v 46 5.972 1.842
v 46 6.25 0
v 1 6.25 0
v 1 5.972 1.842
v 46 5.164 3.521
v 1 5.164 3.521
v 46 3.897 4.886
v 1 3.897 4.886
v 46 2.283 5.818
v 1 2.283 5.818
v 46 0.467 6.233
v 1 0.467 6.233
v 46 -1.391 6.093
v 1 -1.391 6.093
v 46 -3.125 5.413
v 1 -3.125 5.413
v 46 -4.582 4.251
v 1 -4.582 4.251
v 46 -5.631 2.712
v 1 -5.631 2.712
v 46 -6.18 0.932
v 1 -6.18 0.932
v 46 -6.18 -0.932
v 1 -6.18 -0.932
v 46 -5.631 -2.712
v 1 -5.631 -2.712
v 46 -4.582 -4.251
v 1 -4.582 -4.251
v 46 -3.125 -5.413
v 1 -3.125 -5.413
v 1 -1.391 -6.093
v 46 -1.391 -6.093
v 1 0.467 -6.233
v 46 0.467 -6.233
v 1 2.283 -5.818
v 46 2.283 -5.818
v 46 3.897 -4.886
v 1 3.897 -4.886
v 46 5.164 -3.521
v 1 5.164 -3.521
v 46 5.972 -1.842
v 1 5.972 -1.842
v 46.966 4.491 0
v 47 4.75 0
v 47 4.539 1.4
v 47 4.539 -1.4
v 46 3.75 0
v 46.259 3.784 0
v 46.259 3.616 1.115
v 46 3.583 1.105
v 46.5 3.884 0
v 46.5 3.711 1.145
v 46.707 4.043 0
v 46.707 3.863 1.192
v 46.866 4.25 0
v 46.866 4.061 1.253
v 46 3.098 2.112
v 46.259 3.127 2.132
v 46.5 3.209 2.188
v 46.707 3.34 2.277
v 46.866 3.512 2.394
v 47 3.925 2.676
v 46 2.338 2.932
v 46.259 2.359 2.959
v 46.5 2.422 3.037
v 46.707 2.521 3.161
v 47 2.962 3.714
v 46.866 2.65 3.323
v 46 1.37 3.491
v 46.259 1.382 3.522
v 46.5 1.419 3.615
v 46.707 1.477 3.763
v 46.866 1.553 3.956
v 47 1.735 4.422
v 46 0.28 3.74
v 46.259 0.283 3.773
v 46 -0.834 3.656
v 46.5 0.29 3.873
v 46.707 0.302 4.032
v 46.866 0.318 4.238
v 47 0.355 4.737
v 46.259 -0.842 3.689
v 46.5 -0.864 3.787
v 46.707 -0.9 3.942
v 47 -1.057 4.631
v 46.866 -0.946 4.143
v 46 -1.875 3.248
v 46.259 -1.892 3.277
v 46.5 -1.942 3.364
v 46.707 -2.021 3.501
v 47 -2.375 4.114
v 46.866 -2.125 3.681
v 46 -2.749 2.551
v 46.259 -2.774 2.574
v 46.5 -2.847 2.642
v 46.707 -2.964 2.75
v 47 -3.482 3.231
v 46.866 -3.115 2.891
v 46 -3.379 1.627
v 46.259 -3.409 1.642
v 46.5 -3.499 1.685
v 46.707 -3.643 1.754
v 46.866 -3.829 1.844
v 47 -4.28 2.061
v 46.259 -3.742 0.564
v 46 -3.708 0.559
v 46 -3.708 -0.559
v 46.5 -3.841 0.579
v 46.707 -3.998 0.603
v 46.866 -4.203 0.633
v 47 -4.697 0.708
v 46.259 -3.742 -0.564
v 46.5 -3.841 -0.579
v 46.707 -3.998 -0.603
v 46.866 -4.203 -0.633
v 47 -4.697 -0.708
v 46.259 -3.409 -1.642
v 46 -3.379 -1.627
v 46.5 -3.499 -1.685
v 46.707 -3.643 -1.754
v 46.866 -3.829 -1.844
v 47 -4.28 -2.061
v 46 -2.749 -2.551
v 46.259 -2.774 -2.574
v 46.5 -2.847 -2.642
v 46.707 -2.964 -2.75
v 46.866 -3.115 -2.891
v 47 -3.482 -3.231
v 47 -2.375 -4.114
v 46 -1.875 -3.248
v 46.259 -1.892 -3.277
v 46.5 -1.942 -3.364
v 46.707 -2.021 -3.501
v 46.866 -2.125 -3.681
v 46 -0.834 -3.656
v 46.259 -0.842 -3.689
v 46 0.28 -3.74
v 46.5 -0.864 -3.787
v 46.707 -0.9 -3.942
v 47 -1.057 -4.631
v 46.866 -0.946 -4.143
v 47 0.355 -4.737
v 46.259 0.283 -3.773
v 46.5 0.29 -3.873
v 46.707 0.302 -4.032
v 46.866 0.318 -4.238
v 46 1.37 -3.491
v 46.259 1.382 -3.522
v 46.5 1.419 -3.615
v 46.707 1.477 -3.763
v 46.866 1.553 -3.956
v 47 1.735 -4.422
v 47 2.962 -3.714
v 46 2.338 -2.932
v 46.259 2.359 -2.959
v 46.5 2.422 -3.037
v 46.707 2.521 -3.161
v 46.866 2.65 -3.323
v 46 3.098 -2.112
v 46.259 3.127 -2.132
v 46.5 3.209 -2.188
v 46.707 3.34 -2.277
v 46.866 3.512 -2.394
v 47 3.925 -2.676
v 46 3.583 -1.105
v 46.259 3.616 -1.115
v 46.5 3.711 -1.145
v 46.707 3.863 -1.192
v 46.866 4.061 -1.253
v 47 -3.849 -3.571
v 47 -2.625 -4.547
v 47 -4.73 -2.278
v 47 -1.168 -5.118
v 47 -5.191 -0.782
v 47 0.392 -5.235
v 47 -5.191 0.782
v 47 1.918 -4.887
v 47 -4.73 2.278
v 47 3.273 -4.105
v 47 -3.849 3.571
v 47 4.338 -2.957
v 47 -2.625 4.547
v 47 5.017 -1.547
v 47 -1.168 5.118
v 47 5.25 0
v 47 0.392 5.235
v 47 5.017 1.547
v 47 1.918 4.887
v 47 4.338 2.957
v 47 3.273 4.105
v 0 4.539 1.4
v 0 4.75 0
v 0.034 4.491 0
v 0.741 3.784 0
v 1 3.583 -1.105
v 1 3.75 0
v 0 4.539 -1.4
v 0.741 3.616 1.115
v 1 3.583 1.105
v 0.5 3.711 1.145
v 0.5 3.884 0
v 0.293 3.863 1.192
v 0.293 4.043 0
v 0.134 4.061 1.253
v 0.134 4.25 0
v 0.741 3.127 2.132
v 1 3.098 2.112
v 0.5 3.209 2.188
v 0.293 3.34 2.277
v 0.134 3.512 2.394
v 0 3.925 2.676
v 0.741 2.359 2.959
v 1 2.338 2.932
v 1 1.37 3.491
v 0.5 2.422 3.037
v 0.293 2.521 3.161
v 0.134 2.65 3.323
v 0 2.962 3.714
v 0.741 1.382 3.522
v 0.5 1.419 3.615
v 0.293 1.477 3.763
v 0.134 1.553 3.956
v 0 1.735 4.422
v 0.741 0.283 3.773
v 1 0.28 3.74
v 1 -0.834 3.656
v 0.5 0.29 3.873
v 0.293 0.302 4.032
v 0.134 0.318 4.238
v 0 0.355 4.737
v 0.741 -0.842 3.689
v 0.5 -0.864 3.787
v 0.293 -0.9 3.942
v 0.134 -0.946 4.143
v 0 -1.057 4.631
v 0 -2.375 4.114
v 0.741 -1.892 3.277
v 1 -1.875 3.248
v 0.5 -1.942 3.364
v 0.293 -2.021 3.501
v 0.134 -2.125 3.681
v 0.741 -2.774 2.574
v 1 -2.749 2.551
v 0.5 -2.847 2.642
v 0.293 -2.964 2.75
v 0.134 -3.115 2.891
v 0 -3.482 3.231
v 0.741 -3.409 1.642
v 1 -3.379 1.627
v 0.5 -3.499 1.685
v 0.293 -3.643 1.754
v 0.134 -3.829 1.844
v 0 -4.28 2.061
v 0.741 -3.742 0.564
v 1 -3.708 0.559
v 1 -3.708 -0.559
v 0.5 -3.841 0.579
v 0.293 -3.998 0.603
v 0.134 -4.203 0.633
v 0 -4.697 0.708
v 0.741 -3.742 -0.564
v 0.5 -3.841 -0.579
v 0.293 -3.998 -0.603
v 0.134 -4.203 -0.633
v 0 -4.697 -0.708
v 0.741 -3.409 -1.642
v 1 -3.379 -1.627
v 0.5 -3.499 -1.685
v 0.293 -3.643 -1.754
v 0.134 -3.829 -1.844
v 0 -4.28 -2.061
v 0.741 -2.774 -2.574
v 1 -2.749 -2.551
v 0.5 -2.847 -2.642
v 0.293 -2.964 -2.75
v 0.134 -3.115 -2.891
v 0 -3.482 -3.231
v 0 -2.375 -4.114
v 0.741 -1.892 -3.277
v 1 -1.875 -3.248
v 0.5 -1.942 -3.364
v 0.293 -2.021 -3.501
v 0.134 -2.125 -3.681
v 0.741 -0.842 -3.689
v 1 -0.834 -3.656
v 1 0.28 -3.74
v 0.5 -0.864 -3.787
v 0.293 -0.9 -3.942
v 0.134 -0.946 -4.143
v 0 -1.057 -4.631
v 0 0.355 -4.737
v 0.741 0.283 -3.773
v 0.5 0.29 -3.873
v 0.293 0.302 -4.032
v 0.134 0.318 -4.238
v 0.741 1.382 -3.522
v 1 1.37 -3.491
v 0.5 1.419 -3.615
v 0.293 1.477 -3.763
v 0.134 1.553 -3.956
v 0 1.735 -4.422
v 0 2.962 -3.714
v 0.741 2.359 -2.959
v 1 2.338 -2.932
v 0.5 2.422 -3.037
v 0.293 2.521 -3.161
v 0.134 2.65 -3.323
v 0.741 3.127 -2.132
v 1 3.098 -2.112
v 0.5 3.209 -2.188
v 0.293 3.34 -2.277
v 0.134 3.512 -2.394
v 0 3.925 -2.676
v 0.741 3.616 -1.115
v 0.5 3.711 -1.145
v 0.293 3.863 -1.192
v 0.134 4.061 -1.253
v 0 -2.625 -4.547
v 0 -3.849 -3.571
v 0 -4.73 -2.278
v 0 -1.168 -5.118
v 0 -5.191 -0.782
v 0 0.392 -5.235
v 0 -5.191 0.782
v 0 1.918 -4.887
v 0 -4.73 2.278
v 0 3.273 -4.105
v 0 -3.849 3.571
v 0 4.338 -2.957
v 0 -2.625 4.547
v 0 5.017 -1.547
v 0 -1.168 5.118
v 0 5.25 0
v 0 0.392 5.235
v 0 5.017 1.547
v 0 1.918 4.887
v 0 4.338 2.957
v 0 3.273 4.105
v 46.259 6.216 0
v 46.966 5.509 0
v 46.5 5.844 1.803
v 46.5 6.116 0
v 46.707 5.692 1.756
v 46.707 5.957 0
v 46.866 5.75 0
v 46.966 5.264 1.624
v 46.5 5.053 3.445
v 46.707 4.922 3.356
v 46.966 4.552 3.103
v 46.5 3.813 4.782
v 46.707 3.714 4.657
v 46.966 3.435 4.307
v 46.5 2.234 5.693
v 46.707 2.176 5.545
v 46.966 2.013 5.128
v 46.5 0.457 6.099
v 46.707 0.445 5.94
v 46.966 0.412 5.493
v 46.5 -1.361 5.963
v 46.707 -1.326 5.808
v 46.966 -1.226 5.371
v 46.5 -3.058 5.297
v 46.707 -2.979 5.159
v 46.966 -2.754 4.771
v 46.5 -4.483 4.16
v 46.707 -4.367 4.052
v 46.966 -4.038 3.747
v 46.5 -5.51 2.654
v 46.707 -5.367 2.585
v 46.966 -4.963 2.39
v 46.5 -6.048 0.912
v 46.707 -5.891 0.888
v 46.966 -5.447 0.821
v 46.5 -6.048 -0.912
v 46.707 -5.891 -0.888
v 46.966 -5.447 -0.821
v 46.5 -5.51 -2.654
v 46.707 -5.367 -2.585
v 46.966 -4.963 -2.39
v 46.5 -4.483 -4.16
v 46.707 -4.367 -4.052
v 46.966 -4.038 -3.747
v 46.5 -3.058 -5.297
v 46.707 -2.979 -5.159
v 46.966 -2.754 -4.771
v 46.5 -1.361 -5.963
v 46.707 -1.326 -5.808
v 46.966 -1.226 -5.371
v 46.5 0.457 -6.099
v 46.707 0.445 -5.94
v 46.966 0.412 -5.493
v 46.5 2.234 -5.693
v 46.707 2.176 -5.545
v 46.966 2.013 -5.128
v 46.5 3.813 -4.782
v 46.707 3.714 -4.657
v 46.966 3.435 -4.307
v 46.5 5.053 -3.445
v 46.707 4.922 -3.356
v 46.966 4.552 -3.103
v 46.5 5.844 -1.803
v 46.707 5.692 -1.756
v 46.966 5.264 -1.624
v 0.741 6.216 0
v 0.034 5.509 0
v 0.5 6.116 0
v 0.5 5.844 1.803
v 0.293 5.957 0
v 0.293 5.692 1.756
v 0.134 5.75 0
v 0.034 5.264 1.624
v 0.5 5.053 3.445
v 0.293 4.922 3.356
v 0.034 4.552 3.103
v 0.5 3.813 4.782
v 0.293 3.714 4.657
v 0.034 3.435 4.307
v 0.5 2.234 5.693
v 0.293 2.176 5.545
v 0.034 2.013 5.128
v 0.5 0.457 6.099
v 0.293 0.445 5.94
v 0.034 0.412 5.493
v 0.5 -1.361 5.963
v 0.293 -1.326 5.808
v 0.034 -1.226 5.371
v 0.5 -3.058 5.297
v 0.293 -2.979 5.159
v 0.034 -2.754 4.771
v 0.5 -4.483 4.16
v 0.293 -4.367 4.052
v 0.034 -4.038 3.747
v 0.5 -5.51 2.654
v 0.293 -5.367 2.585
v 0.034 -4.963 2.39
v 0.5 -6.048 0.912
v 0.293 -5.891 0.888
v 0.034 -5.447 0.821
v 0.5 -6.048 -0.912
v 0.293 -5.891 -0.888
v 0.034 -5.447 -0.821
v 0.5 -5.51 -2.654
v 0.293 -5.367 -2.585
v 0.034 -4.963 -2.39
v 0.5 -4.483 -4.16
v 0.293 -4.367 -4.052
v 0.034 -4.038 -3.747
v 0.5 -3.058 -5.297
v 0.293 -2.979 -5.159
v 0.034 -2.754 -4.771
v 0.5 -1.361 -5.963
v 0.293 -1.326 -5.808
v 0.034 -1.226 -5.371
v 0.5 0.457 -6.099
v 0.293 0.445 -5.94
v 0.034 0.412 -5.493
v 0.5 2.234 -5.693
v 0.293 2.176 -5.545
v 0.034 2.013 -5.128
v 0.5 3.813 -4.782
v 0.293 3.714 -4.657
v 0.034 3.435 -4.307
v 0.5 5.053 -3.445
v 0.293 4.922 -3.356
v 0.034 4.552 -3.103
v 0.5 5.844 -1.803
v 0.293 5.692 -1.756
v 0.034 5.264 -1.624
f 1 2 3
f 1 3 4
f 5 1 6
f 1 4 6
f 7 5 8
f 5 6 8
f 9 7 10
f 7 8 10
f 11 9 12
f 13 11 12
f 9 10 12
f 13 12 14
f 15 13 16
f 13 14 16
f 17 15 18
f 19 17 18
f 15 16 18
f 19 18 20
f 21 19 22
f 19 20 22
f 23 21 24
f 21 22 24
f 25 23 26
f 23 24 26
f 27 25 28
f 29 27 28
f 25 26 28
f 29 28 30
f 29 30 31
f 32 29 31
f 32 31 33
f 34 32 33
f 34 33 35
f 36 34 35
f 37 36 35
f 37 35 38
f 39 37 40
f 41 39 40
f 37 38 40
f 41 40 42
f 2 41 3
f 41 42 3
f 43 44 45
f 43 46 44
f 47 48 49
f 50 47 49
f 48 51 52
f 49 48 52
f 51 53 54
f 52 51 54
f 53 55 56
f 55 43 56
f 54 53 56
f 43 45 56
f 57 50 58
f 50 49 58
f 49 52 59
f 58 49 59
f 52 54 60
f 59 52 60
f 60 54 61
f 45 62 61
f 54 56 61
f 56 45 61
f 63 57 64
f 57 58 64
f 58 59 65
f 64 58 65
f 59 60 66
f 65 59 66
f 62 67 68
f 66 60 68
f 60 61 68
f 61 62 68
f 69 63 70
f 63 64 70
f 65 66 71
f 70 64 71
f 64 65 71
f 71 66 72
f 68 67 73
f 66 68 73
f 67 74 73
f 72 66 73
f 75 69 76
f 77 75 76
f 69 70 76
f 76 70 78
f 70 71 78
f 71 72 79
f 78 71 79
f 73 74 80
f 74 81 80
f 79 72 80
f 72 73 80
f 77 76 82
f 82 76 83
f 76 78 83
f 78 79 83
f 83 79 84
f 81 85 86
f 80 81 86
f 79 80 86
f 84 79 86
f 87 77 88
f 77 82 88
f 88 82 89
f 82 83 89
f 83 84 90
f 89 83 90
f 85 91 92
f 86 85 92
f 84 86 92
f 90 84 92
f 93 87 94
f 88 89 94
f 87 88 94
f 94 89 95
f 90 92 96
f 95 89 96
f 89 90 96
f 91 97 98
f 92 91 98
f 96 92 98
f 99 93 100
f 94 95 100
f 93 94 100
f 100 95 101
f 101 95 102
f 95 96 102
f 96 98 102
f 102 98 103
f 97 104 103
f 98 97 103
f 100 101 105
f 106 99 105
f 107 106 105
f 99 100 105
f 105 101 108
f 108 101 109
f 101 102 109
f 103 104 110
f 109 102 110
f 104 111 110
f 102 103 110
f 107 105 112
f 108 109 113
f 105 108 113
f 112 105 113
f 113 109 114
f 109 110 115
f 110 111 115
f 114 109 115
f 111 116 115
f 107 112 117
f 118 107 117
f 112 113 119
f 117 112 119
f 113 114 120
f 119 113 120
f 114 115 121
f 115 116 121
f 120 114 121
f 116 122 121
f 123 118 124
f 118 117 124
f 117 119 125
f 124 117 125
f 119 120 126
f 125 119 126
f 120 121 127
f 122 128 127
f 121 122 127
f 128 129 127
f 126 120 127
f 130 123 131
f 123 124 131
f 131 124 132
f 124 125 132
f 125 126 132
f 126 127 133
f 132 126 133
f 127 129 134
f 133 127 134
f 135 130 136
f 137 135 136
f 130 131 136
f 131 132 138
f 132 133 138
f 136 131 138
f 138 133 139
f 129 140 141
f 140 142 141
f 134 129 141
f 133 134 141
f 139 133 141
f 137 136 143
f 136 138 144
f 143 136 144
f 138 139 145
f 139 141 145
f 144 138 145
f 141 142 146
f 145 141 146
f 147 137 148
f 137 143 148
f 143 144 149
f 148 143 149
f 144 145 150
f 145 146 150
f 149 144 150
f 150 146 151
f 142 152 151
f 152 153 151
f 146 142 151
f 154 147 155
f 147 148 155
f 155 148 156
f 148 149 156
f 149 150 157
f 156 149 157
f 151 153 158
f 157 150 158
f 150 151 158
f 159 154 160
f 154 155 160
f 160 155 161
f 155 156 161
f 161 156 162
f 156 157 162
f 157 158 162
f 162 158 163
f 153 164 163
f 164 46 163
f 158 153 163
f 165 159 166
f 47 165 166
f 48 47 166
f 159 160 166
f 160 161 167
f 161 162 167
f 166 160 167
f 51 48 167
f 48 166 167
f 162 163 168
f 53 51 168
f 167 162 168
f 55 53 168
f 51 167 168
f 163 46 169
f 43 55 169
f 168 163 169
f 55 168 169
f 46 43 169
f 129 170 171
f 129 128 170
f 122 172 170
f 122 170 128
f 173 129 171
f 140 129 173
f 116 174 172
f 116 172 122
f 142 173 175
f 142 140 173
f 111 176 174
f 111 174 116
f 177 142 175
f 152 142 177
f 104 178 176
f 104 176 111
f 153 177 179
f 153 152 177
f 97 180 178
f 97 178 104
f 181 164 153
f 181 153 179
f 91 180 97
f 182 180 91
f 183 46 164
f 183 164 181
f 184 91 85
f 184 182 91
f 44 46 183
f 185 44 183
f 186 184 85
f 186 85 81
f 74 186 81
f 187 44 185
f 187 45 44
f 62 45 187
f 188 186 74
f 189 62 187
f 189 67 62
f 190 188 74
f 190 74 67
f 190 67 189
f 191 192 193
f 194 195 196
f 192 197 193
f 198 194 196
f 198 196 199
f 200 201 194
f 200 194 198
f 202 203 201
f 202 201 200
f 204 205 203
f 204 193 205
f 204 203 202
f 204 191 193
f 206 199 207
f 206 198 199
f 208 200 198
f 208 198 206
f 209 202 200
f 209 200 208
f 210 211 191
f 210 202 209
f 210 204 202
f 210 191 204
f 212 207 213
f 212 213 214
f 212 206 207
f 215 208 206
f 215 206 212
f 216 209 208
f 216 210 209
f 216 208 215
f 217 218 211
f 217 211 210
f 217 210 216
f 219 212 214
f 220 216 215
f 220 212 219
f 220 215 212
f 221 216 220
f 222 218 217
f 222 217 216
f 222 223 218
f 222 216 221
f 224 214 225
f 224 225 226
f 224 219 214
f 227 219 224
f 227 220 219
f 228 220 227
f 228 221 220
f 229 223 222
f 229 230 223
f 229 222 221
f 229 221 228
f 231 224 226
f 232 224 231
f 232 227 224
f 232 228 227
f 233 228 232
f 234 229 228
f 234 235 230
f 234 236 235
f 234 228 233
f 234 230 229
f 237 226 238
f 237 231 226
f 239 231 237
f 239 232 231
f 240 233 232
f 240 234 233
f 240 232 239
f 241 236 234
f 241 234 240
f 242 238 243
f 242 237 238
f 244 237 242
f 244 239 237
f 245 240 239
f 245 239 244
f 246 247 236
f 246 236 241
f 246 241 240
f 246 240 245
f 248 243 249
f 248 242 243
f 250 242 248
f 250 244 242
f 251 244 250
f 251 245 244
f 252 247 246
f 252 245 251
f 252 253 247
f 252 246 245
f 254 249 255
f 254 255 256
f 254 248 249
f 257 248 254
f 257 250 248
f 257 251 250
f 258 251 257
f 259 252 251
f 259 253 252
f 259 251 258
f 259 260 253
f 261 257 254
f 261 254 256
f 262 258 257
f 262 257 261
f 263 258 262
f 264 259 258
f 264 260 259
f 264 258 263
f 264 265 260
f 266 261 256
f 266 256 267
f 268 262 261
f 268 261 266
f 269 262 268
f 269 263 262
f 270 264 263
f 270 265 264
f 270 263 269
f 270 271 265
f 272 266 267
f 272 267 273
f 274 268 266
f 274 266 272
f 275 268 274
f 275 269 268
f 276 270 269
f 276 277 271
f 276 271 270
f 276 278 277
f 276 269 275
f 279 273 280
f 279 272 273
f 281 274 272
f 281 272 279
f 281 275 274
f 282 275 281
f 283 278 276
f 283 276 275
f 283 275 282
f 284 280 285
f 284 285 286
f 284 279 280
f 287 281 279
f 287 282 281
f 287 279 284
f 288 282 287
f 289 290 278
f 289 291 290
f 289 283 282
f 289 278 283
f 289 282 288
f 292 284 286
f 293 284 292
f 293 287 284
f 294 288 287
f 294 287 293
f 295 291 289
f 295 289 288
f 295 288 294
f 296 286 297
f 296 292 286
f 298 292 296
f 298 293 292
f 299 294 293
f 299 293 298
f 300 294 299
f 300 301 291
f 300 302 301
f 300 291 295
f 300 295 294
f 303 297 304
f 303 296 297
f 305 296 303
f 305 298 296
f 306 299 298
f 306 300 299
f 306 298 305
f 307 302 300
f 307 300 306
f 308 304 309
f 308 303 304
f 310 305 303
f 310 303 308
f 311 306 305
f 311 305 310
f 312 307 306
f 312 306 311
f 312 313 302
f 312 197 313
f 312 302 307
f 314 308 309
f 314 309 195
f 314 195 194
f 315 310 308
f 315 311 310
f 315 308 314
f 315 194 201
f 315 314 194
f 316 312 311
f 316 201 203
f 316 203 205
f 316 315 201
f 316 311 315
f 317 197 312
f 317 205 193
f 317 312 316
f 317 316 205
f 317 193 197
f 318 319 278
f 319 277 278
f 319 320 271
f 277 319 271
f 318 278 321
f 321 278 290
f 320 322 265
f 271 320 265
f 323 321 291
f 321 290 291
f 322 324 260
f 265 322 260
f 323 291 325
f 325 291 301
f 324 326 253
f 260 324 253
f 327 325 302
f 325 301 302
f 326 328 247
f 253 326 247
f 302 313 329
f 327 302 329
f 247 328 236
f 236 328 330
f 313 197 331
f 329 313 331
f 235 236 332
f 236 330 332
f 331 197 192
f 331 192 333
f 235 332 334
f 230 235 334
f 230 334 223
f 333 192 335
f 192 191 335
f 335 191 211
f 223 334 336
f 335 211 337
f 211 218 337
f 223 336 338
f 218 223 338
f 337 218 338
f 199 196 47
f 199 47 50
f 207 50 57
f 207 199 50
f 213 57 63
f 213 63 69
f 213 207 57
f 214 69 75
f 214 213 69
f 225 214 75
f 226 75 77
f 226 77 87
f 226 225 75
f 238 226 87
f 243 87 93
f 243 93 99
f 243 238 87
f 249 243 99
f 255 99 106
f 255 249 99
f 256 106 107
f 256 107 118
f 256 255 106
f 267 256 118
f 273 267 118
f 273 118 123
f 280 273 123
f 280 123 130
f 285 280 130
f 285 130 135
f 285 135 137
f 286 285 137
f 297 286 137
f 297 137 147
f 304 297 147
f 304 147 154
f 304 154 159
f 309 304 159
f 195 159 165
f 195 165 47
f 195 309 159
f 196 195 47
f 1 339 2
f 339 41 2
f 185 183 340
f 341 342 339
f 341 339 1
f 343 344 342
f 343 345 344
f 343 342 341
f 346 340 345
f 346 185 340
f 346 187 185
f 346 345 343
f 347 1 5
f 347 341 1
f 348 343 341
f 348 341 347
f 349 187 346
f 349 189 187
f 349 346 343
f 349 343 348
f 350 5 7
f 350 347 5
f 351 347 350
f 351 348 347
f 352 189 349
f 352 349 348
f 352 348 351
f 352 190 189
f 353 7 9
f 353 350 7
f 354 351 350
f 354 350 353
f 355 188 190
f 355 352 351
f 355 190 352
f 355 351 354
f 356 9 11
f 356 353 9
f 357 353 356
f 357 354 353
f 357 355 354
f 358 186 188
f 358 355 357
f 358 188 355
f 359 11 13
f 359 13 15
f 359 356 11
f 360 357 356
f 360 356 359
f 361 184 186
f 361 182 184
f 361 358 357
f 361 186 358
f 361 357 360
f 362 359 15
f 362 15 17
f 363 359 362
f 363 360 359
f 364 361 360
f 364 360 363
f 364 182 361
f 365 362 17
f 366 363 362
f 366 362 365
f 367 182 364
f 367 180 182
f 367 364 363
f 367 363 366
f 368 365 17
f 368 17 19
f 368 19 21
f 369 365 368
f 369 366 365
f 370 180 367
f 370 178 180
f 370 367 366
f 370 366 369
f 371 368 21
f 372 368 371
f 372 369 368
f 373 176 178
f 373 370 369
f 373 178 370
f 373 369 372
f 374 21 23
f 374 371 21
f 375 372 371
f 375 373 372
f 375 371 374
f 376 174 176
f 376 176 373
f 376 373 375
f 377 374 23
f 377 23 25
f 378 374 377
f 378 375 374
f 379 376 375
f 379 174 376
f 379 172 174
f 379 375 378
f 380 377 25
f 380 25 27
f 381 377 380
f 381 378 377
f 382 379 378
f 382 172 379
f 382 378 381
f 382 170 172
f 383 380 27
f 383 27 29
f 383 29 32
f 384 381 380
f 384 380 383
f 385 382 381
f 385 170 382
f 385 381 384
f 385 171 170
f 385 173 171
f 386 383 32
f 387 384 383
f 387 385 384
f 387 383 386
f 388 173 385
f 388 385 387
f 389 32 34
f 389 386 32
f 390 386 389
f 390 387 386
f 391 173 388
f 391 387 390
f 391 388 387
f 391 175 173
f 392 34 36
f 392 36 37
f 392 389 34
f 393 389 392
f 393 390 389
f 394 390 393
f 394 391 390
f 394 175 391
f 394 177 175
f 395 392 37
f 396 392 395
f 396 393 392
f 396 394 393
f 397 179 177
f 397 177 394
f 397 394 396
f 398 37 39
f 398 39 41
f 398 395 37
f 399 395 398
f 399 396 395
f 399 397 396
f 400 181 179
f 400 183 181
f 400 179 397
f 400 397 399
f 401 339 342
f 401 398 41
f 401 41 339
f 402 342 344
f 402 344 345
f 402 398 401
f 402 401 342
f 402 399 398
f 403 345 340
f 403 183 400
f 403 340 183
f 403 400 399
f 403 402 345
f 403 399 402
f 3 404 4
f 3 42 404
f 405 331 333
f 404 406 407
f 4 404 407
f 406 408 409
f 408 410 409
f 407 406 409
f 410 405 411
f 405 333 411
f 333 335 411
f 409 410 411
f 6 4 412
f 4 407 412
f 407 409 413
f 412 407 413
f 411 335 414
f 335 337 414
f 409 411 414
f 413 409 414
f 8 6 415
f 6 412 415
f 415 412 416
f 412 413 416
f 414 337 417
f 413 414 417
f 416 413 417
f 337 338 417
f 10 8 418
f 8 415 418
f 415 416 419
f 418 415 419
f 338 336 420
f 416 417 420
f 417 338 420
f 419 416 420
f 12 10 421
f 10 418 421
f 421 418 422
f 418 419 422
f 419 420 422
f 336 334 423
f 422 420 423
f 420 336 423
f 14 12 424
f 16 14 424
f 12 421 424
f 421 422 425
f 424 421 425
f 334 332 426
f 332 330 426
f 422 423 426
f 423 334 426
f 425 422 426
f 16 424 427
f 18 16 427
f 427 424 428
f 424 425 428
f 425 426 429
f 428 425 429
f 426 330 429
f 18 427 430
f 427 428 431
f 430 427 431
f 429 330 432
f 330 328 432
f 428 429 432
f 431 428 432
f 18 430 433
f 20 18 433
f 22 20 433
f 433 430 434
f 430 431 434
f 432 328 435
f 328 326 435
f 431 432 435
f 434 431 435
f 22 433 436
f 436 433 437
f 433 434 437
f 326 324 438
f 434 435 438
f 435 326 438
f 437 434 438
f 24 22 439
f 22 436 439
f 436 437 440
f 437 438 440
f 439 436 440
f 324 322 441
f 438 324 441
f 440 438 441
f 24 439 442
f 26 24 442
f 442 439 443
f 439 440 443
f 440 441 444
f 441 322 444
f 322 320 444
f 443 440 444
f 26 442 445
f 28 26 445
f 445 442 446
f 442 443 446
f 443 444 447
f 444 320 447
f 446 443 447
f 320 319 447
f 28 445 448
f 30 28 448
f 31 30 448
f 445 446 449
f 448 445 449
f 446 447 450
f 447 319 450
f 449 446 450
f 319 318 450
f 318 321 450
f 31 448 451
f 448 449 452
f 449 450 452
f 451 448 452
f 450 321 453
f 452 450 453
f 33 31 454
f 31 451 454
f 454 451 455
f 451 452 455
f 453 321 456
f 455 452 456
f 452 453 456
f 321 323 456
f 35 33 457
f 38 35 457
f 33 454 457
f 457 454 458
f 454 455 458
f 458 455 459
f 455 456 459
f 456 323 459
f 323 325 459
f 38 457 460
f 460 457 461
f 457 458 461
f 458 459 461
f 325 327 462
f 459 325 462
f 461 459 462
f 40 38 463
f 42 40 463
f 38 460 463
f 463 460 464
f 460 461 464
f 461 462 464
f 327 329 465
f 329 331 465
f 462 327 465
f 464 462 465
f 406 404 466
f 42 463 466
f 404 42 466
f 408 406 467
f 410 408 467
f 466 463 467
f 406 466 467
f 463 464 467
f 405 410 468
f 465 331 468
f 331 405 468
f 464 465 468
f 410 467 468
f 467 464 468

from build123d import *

# Parameters (mm, degrees)
F0_R     = 6.25
F0_R_2   = 3.75
F1_DEPTH = 47
F2_R     = 1


with BuildPart() as f1:
    # F0 (on Right) → F1 (new body)
    with BuildSketch(Plane.YZ):
        Circle(F0_R)
        Circle(F0_R_2, mode=Mode.SUBTRACT)
    extrude(amount=F1_DEPTH)

    # F2
    f2_edges = [f1.edges().sort_by_distance(p)[0] for p in [
        (0, -6.25, 0),
        (0, -3.75, 0),
        (47, -6.25, 0),
        (47, -3.75, 0),
    ]]
    fillet(f2_edges, radius=F2_R)


solid = f1.part
